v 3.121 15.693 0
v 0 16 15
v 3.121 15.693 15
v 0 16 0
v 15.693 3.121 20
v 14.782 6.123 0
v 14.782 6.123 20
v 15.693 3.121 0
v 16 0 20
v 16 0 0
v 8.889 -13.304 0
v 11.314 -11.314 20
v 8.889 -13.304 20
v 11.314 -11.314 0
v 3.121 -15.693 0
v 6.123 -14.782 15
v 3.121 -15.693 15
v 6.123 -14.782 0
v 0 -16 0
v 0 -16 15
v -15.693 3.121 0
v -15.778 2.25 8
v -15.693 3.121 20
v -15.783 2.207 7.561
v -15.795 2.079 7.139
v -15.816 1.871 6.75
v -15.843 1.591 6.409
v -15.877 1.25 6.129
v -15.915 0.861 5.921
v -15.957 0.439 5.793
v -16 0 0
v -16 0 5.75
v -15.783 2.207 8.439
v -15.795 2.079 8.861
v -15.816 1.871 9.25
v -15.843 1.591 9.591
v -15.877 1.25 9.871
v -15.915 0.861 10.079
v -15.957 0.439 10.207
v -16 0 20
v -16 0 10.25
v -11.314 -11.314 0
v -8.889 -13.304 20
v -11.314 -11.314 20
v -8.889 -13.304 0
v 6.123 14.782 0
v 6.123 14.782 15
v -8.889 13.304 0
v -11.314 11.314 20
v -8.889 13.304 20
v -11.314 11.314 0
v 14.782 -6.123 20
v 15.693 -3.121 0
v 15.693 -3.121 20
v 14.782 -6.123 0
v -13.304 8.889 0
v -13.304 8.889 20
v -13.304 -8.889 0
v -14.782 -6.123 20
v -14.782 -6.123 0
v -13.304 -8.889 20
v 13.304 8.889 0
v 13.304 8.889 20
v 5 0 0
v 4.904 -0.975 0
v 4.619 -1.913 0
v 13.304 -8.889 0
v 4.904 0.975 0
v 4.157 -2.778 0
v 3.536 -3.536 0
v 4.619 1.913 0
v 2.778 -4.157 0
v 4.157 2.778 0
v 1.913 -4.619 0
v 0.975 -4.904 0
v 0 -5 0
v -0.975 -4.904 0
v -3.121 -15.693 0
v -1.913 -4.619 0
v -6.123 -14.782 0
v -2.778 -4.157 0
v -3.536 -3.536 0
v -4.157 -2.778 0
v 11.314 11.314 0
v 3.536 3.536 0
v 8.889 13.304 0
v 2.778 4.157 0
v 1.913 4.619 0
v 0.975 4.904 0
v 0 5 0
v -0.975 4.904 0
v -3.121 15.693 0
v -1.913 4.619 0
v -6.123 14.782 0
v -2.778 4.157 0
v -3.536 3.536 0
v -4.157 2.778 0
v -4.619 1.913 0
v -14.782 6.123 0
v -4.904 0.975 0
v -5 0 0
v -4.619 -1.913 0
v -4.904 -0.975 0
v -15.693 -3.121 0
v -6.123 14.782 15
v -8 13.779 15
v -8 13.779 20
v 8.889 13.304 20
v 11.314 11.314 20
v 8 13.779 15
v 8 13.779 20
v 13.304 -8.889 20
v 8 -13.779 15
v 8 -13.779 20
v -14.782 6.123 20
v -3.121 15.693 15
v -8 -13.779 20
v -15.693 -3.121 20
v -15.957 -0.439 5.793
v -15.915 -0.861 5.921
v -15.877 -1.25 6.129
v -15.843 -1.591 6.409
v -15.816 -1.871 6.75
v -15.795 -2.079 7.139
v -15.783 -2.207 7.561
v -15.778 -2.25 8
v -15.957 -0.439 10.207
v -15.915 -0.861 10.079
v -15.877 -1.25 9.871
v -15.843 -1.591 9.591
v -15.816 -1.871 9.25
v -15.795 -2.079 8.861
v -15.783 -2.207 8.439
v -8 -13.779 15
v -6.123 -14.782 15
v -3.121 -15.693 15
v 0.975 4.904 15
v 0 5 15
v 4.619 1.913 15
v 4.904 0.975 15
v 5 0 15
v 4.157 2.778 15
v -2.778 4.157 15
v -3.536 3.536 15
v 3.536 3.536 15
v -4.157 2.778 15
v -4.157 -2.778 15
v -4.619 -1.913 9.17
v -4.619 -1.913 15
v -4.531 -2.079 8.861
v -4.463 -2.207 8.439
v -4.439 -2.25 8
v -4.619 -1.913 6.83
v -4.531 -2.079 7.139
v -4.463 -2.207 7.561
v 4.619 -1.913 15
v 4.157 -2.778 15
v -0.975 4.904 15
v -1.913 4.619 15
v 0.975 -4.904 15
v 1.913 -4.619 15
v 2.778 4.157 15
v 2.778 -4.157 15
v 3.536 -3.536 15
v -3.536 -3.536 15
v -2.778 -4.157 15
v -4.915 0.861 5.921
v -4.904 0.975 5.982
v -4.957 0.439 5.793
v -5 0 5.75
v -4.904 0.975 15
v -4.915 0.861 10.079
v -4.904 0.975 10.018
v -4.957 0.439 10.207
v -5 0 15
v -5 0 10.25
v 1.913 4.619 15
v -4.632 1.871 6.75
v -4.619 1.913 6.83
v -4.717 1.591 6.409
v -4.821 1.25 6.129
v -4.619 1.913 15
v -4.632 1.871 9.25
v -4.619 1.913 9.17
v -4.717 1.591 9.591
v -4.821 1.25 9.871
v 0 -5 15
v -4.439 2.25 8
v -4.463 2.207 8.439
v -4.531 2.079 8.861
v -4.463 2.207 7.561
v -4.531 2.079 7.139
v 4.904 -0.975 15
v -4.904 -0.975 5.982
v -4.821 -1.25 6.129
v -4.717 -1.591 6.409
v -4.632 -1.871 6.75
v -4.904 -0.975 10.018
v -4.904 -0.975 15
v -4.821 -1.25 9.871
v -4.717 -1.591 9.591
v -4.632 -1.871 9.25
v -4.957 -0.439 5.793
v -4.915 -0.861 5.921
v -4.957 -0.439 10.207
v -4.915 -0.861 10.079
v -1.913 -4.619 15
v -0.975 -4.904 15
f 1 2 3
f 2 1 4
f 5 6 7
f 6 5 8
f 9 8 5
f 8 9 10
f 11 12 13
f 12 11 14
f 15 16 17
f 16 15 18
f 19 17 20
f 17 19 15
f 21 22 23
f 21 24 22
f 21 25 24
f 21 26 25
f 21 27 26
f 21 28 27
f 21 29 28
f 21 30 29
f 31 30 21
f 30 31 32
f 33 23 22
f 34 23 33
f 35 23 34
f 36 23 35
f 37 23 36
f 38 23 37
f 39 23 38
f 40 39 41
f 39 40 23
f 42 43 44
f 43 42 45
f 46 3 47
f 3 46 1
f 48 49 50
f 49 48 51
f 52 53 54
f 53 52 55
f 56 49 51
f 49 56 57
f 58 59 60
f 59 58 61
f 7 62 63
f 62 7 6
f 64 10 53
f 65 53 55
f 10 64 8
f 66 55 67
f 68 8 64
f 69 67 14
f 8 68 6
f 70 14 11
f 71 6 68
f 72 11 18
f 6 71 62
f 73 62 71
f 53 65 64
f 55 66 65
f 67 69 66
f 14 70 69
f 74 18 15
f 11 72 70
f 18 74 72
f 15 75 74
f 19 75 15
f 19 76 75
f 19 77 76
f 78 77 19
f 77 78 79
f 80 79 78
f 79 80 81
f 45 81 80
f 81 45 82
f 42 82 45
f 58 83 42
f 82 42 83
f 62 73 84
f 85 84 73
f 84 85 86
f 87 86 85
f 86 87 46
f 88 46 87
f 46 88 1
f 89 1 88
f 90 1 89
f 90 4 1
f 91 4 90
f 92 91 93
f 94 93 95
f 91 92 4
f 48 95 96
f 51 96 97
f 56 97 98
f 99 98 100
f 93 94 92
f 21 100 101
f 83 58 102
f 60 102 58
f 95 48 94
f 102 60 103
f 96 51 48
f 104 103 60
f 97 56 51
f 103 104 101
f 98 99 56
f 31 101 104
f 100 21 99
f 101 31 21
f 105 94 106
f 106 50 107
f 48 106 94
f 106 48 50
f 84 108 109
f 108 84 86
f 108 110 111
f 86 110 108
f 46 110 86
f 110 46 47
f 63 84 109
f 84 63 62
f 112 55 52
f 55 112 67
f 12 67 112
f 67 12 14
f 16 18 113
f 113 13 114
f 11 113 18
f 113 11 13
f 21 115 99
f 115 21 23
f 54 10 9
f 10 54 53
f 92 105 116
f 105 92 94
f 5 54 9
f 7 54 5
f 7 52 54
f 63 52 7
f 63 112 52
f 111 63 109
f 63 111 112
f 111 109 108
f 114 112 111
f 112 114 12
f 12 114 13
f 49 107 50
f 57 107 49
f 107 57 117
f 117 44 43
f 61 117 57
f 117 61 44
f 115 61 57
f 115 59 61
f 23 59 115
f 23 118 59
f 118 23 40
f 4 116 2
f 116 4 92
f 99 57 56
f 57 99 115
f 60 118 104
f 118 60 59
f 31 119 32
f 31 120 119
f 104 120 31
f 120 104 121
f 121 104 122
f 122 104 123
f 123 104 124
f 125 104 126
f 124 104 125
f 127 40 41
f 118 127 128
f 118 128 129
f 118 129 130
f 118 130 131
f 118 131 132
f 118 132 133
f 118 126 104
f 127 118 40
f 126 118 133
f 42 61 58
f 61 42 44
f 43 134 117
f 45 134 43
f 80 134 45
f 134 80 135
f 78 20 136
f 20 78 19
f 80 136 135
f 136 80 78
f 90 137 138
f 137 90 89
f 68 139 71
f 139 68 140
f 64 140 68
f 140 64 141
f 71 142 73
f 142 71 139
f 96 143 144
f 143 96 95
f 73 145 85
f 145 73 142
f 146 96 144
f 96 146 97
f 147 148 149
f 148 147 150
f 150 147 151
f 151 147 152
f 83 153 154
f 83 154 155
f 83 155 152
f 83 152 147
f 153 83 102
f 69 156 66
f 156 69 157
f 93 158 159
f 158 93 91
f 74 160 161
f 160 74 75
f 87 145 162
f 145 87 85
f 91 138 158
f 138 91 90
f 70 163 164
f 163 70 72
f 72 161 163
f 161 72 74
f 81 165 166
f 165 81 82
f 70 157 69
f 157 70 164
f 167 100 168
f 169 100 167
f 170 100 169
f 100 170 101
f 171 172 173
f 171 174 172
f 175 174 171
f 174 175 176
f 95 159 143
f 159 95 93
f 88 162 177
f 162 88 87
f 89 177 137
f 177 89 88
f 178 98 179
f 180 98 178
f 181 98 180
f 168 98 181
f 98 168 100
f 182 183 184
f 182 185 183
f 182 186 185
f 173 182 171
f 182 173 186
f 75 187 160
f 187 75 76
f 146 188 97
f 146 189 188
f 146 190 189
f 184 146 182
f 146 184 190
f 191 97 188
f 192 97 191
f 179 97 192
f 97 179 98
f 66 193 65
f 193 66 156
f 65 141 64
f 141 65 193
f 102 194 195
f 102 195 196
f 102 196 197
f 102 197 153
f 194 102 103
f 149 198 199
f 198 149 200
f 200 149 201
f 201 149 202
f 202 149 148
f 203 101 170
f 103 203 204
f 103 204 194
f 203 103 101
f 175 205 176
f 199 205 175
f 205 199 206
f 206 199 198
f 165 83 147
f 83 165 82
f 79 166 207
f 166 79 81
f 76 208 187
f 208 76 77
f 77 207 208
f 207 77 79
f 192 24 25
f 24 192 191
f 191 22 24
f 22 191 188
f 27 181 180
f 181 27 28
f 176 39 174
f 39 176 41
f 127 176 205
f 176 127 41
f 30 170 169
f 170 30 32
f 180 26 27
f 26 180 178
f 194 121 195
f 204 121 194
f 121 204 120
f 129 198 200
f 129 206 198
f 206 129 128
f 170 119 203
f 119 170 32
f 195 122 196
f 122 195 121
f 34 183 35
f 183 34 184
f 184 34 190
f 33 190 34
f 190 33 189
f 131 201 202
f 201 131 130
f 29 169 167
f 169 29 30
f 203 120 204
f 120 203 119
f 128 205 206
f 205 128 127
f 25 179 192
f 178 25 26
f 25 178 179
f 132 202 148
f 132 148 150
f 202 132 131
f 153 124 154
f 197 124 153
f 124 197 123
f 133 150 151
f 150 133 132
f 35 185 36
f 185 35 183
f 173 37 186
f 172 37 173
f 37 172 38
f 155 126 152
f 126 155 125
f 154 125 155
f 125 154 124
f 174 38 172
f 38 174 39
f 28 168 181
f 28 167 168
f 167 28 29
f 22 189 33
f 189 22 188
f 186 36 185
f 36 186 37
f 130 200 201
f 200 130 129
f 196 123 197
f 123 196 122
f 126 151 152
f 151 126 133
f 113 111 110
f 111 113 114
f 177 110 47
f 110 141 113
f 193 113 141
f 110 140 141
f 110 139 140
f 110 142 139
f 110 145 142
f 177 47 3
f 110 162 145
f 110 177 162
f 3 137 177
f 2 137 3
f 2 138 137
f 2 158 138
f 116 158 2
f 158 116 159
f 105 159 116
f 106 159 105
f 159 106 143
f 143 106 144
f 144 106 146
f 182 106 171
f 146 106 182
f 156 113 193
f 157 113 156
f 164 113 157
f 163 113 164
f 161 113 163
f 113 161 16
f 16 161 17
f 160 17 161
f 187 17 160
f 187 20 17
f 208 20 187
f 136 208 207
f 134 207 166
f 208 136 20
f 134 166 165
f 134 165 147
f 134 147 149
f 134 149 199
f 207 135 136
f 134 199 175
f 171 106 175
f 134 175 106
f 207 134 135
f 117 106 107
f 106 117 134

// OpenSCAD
$fn = 32;

// ----------------------------------------------------------------------
// Oldham coupling hub: 32 x 20 mm
// ----------------------------------------------------------------------

// --- parameters (mm) ---
body_d = 32;              // hub diameter
body_l = 16;              // hub length
shaft_d = 10;             // shaft bore
cam_w = 16;               // drive tongue width
tongue_h = 4;             // drive tongue height
set_d = 4.5;              // set screw tap hole

module hub() {
  /* the slot side is a raised disc with a groove milled across it */
  cylinder(h = body_l + tongue_h, d = body_d);
}

difference() {
  hub();
  translate([0, 0, -1]) cylinder(h = body_l + tongue_h + 2, d = shaft_d);
  translate([-body_d / 2 - 1, 0, body_l * 0.5])
    rotate([0, 90, 0]) cylinder(h = body_d / 2 + 2, d = set_d);
  translate([-cam_w / 2, -body_d / 2 - 1, body_l - 1])
    cube([cam_w, body_d + 2, tongue_h + 1]);
}
